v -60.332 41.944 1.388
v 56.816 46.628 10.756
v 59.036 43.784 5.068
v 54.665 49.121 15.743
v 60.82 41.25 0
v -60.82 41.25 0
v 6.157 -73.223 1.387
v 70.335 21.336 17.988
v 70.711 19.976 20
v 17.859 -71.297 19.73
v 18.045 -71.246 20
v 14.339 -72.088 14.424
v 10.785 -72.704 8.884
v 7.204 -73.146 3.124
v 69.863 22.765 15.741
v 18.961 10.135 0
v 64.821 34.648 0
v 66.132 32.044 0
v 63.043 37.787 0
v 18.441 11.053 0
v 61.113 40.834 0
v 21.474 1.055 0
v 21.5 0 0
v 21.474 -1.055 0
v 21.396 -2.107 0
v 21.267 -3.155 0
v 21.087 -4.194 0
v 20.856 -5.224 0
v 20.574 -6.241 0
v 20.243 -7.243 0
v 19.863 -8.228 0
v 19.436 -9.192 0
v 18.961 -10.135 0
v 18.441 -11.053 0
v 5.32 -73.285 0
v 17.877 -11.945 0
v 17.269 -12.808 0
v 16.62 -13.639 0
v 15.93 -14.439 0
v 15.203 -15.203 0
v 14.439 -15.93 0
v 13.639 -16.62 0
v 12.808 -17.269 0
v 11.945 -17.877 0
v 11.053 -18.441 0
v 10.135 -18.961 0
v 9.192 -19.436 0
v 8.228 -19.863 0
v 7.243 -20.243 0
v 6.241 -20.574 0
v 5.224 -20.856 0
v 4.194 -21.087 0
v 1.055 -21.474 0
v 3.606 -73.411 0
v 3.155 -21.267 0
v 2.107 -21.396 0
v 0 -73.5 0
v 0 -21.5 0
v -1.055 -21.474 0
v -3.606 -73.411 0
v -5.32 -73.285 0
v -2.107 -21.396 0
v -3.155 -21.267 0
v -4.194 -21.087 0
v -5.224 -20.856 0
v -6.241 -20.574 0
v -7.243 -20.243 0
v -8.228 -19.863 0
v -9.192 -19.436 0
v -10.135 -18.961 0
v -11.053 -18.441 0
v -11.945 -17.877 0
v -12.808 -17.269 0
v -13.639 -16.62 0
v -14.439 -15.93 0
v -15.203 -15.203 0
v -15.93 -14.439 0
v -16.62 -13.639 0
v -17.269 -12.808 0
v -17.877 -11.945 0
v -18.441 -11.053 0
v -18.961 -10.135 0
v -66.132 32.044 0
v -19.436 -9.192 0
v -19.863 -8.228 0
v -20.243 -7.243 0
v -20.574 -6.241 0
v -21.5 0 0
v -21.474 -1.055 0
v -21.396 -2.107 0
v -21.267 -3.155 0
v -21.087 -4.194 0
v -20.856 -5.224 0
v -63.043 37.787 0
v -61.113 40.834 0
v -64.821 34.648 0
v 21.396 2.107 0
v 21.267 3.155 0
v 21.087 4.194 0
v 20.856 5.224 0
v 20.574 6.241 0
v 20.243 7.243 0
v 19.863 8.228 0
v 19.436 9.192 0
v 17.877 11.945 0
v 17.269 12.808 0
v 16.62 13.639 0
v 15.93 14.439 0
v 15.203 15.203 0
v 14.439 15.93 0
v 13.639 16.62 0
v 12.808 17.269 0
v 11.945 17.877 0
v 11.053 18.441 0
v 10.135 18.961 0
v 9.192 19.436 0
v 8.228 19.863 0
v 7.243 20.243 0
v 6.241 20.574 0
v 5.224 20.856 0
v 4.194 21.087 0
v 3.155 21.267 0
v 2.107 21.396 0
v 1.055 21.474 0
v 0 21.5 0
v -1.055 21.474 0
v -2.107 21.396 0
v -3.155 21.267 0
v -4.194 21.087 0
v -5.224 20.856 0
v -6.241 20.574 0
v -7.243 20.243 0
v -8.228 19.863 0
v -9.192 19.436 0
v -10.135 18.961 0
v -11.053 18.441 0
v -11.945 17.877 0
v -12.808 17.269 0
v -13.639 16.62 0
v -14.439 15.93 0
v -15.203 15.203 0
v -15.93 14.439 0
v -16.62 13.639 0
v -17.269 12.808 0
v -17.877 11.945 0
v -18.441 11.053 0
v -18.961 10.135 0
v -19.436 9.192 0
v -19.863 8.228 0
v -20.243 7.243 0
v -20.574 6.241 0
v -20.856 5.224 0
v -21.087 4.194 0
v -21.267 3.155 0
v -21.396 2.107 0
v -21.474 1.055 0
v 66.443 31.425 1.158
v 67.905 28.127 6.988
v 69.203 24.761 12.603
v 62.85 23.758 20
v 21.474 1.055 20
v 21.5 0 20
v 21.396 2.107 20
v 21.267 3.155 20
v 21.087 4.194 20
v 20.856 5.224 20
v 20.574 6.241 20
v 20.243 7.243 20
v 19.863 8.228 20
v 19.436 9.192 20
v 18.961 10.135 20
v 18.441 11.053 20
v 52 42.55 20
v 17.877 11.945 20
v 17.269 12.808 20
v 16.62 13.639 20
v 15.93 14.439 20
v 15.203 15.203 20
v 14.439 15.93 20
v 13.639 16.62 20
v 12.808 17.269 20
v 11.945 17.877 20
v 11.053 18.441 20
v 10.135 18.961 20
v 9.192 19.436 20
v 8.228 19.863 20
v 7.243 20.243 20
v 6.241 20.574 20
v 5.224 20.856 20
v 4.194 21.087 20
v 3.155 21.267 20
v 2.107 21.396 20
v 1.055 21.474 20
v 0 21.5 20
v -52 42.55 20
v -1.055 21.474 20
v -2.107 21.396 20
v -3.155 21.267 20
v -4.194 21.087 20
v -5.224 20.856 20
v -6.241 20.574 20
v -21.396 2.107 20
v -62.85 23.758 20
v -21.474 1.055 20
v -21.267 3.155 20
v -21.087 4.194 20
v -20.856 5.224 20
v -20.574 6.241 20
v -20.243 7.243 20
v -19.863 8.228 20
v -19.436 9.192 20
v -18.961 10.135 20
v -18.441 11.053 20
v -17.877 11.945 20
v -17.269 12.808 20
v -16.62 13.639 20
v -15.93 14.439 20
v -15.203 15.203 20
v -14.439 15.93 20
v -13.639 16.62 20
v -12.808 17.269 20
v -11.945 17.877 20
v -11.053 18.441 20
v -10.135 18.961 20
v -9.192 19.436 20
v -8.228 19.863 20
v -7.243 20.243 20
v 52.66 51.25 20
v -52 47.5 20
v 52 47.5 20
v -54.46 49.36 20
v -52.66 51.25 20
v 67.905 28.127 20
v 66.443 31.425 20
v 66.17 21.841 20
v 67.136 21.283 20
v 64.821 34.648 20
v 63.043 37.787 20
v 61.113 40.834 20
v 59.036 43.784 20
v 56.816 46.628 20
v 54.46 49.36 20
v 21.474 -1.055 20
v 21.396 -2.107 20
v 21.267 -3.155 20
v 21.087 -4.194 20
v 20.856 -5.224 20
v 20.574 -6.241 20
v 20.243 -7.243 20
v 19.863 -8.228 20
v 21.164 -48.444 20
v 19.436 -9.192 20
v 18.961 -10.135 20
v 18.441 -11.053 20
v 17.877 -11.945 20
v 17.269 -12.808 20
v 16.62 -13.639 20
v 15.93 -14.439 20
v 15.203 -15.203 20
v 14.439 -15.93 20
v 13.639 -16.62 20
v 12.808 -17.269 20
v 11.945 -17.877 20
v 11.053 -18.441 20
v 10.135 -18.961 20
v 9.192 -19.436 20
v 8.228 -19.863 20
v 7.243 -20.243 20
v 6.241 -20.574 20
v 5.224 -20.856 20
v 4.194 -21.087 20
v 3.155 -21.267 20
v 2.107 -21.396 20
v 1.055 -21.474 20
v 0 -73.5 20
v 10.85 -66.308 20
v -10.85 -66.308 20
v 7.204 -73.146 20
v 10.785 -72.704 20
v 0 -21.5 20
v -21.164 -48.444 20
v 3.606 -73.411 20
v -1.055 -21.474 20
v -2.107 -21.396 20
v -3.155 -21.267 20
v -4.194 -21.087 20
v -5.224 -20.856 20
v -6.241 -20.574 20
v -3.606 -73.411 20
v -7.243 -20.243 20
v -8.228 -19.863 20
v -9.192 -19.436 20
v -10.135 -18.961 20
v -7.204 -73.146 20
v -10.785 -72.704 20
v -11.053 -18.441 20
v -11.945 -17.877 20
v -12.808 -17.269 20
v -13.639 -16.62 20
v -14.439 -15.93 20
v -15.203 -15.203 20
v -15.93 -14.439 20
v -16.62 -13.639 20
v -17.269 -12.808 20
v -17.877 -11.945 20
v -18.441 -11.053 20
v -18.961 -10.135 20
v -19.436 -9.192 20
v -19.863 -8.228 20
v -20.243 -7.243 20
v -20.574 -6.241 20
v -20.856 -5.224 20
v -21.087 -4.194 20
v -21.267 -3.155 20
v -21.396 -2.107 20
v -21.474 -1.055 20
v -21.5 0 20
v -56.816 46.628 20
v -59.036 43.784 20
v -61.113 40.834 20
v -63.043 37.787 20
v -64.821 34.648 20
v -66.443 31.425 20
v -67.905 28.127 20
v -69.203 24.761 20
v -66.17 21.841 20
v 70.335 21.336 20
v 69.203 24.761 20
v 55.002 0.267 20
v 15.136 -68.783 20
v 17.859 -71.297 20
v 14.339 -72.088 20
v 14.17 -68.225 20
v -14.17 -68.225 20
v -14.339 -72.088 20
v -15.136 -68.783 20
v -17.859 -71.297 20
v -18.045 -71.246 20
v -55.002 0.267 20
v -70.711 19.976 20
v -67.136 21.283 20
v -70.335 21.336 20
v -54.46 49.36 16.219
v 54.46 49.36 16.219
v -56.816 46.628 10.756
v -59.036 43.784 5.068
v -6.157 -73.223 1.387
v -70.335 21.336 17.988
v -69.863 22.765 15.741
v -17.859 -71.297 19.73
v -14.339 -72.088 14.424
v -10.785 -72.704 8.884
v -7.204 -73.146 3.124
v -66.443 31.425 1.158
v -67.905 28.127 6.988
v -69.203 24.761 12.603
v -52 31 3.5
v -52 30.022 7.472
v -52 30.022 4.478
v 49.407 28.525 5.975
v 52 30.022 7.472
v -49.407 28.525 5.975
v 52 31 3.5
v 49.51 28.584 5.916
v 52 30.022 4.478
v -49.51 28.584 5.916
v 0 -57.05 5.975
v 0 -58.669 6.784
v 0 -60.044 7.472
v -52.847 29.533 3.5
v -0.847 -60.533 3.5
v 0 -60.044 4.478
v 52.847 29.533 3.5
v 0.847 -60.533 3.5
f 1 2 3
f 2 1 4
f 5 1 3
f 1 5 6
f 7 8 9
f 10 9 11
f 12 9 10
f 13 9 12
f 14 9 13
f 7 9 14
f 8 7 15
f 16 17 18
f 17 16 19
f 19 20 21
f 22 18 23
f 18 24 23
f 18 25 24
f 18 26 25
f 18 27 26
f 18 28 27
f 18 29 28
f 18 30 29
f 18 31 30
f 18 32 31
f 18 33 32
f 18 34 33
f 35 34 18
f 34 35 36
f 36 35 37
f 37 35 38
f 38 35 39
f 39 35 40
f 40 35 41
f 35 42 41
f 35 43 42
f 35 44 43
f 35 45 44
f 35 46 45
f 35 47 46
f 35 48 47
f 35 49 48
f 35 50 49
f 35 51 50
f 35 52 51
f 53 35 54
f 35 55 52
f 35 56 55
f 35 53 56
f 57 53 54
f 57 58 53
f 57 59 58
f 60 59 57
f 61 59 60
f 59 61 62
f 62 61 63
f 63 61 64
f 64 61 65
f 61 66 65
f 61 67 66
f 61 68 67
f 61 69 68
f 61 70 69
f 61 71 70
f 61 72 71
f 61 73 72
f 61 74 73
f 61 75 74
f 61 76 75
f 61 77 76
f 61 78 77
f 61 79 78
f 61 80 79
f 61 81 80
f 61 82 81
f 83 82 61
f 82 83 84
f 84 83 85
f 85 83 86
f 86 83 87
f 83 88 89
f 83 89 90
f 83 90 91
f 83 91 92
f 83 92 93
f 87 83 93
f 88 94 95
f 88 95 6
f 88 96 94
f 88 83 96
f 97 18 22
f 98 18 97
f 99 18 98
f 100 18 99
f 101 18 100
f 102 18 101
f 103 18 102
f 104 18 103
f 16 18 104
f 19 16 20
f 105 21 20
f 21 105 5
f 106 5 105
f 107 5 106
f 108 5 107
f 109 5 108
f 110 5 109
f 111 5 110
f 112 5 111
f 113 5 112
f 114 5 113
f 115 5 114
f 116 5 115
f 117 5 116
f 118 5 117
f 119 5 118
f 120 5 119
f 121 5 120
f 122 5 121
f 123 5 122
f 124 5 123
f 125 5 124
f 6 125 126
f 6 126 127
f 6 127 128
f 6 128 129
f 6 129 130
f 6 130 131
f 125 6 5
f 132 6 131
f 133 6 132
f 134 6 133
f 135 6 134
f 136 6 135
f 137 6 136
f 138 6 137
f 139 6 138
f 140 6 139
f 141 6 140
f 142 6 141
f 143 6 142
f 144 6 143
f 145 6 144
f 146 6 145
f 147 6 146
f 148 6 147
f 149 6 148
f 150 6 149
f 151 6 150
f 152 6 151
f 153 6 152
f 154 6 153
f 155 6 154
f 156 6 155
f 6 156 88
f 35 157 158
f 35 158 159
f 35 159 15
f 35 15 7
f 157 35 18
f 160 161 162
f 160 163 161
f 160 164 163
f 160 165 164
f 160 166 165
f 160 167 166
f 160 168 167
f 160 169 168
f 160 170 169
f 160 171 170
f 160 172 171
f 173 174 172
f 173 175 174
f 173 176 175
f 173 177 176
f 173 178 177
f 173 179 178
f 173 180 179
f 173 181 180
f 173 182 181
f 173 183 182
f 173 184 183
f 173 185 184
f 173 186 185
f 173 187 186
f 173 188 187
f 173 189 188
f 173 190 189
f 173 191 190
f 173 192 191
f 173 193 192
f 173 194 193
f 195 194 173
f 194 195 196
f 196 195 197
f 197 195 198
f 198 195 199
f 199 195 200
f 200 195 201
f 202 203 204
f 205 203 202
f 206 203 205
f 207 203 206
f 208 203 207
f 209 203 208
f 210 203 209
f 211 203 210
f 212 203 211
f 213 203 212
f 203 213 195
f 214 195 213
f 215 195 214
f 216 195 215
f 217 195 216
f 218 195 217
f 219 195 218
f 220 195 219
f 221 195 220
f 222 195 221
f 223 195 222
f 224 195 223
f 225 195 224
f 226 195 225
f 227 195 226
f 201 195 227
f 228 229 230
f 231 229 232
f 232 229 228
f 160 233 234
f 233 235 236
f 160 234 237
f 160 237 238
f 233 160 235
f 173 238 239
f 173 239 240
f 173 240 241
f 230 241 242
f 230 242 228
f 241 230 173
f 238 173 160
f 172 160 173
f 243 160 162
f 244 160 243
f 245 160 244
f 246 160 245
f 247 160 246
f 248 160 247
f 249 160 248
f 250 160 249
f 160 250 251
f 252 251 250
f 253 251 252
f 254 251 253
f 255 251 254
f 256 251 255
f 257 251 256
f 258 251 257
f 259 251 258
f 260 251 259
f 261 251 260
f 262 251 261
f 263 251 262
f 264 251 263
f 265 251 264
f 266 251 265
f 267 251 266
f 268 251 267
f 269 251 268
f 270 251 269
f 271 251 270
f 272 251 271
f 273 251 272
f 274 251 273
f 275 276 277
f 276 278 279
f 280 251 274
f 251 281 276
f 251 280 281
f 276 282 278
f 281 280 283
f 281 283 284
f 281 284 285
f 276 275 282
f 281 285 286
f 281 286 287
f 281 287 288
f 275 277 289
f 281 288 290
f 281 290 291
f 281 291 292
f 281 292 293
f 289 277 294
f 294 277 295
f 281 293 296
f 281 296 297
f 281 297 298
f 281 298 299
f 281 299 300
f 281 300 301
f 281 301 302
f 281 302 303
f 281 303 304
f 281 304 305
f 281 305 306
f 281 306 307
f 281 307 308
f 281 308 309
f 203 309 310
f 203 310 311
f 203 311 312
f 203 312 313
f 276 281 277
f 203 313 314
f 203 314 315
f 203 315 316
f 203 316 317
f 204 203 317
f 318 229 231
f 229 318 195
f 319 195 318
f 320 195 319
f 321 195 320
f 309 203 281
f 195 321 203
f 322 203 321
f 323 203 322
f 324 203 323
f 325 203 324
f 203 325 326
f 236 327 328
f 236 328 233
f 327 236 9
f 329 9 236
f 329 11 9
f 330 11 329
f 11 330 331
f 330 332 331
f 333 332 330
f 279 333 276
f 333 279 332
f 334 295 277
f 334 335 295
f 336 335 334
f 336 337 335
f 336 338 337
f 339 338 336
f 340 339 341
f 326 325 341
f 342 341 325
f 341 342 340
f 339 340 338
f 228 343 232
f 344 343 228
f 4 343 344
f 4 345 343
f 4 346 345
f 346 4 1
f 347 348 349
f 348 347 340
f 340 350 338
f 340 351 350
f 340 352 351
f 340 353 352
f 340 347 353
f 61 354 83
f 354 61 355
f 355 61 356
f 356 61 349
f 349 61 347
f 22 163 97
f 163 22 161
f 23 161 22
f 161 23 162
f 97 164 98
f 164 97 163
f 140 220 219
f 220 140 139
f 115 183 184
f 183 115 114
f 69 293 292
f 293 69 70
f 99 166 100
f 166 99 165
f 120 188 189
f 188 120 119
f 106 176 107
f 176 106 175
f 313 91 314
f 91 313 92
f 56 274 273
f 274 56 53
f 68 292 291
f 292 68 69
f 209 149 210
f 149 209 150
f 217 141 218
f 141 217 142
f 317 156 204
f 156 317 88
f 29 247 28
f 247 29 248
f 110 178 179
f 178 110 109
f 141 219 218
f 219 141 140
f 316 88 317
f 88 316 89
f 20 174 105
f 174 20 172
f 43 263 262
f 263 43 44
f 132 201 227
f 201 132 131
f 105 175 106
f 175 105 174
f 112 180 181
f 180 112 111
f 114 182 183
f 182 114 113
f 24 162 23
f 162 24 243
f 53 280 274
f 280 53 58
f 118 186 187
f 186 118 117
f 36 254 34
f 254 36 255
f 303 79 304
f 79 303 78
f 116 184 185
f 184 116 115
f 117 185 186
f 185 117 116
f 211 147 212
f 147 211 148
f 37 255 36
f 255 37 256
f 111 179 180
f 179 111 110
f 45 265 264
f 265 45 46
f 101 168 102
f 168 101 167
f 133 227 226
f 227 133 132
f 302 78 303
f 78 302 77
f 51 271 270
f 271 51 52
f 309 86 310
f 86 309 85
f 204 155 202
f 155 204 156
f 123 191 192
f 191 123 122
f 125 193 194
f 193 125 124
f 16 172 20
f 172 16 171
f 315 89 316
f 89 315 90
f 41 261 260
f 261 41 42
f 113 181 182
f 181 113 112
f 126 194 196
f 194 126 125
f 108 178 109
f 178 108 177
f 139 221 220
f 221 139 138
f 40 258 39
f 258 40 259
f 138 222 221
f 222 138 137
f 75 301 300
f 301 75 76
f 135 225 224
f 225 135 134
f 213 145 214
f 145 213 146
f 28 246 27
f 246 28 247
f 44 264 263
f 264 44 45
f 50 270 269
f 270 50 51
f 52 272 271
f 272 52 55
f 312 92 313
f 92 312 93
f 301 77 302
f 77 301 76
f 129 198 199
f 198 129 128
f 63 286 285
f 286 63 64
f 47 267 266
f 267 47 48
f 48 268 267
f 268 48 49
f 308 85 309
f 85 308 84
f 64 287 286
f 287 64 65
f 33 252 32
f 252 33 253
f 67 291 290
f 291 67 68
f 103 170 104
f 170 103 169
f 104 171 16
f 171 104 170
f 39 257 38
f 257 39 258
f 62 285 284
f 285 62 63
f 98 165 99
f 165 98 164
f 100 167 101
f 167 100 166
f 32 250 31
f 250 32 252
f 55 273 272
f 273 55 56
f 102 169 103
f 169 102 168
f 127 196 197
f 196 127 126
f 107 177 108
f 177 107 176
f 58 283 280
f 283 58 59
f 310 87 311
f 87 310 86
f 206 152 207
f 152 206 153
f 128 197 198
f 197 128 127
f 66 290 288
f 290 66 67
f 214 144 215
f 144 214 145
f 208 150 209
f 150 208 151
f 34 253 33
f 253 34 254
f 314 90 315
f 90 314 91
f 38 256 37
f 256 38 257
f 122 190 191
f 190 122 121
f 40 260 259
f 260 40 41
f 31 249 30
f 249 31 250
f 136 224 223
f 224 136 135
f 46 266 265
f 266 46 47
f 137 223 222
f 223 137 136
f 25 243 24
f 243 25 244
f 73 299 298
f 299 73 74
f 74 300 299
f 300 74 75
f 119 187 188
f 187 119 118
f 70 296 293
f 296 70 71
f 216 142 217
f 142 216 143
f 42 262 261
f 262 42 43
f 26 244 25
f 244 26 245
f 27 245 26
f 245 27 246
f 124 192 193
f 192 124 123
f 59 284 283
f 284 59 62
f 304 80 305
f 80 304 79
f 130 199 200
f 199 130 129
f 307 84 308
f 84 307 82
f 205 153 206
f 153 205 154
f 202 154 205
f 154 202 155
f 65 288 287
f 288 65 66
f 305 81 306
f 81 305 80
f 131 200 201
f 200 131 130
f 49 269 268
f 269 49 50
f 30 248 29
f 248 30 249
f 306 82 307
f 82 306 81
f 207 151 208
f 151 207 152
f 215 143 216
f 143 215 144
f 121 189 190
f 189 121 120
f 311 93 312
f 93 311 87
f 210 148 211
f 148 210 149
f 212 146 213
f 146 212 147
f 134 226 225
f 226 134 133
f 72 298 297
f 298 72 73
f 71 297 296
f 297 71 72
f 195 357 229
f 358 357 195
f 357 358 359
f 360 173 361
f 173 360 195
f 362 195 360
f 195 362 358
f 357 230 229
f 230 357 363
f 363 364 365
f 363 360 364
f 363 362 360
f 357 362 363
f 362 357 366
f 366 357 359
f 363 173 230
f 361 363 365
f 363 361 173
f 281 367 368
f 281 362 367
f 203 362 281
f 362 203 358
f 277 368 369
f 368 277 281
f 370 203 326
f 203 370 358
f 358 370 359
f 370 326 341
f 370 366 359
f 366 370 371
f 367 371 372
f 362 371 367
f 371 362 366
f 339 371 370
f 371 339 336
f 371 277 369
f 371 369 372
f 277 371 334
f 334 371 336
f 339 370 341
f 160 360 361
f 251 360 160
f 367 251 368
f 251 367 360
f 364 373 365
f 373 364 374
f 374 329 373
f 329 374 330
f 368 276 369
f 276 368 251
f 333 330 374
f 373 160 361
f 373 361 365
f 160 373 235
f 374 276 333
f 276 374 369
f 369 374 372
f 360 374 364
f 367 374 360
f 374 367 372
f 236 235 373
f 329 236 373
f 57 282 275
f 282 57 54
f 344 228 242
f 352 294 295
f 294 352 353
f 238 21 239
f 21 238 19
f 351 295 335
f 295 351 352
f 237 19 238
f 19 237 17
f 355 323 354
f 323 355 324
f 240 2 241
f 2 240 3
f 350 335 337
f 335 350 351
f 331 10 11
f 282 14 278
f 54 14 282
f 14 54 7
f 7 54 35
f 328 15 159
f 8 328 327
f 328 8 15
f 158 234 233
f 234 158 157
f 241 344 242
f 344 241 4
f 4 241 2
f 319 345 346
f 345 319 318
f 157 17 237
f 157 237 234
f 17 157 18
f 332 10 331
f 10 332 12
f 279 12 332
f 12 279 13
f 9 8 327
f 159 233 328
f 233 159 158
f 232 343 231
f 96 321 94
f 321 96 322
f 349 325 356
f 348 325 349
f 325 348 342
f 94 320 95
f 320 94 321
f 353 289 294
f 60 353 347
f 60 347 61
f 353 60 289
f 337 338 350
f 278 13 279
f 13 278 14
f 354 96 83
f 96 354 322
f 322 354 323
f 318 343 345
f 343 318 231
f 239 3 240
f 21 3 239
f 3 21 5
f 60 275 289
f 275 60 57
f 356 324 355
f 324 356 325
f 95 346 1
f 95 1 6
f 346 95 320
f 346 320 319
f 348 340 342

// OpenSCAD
$fn = 128; // smoothness

pipe_radius = 21.5;

intersection() {
  difference() {

    rotate(a=30, v=[0,0,1])
    cylinder(r1=pipe_radius + 61, r2=pipe_radius+81, h=20, $fn=3);

    cylinder(r=pipe_radius, h=100);

    slit();

    rotate(a=120, v=[0,0,1])
    slit();
    rotate(a=-120, v=[0,0,1])
    slit();
  }

  cylinder(r=pipe_radius + 52, h=100);
}
  

module slit() {
  translate([0, 31, 3.5])
  rotate(a=45, v=[1,0,0])
  translate([-52, 0, 0])
  cube([104, 100, 3.5]);
}
